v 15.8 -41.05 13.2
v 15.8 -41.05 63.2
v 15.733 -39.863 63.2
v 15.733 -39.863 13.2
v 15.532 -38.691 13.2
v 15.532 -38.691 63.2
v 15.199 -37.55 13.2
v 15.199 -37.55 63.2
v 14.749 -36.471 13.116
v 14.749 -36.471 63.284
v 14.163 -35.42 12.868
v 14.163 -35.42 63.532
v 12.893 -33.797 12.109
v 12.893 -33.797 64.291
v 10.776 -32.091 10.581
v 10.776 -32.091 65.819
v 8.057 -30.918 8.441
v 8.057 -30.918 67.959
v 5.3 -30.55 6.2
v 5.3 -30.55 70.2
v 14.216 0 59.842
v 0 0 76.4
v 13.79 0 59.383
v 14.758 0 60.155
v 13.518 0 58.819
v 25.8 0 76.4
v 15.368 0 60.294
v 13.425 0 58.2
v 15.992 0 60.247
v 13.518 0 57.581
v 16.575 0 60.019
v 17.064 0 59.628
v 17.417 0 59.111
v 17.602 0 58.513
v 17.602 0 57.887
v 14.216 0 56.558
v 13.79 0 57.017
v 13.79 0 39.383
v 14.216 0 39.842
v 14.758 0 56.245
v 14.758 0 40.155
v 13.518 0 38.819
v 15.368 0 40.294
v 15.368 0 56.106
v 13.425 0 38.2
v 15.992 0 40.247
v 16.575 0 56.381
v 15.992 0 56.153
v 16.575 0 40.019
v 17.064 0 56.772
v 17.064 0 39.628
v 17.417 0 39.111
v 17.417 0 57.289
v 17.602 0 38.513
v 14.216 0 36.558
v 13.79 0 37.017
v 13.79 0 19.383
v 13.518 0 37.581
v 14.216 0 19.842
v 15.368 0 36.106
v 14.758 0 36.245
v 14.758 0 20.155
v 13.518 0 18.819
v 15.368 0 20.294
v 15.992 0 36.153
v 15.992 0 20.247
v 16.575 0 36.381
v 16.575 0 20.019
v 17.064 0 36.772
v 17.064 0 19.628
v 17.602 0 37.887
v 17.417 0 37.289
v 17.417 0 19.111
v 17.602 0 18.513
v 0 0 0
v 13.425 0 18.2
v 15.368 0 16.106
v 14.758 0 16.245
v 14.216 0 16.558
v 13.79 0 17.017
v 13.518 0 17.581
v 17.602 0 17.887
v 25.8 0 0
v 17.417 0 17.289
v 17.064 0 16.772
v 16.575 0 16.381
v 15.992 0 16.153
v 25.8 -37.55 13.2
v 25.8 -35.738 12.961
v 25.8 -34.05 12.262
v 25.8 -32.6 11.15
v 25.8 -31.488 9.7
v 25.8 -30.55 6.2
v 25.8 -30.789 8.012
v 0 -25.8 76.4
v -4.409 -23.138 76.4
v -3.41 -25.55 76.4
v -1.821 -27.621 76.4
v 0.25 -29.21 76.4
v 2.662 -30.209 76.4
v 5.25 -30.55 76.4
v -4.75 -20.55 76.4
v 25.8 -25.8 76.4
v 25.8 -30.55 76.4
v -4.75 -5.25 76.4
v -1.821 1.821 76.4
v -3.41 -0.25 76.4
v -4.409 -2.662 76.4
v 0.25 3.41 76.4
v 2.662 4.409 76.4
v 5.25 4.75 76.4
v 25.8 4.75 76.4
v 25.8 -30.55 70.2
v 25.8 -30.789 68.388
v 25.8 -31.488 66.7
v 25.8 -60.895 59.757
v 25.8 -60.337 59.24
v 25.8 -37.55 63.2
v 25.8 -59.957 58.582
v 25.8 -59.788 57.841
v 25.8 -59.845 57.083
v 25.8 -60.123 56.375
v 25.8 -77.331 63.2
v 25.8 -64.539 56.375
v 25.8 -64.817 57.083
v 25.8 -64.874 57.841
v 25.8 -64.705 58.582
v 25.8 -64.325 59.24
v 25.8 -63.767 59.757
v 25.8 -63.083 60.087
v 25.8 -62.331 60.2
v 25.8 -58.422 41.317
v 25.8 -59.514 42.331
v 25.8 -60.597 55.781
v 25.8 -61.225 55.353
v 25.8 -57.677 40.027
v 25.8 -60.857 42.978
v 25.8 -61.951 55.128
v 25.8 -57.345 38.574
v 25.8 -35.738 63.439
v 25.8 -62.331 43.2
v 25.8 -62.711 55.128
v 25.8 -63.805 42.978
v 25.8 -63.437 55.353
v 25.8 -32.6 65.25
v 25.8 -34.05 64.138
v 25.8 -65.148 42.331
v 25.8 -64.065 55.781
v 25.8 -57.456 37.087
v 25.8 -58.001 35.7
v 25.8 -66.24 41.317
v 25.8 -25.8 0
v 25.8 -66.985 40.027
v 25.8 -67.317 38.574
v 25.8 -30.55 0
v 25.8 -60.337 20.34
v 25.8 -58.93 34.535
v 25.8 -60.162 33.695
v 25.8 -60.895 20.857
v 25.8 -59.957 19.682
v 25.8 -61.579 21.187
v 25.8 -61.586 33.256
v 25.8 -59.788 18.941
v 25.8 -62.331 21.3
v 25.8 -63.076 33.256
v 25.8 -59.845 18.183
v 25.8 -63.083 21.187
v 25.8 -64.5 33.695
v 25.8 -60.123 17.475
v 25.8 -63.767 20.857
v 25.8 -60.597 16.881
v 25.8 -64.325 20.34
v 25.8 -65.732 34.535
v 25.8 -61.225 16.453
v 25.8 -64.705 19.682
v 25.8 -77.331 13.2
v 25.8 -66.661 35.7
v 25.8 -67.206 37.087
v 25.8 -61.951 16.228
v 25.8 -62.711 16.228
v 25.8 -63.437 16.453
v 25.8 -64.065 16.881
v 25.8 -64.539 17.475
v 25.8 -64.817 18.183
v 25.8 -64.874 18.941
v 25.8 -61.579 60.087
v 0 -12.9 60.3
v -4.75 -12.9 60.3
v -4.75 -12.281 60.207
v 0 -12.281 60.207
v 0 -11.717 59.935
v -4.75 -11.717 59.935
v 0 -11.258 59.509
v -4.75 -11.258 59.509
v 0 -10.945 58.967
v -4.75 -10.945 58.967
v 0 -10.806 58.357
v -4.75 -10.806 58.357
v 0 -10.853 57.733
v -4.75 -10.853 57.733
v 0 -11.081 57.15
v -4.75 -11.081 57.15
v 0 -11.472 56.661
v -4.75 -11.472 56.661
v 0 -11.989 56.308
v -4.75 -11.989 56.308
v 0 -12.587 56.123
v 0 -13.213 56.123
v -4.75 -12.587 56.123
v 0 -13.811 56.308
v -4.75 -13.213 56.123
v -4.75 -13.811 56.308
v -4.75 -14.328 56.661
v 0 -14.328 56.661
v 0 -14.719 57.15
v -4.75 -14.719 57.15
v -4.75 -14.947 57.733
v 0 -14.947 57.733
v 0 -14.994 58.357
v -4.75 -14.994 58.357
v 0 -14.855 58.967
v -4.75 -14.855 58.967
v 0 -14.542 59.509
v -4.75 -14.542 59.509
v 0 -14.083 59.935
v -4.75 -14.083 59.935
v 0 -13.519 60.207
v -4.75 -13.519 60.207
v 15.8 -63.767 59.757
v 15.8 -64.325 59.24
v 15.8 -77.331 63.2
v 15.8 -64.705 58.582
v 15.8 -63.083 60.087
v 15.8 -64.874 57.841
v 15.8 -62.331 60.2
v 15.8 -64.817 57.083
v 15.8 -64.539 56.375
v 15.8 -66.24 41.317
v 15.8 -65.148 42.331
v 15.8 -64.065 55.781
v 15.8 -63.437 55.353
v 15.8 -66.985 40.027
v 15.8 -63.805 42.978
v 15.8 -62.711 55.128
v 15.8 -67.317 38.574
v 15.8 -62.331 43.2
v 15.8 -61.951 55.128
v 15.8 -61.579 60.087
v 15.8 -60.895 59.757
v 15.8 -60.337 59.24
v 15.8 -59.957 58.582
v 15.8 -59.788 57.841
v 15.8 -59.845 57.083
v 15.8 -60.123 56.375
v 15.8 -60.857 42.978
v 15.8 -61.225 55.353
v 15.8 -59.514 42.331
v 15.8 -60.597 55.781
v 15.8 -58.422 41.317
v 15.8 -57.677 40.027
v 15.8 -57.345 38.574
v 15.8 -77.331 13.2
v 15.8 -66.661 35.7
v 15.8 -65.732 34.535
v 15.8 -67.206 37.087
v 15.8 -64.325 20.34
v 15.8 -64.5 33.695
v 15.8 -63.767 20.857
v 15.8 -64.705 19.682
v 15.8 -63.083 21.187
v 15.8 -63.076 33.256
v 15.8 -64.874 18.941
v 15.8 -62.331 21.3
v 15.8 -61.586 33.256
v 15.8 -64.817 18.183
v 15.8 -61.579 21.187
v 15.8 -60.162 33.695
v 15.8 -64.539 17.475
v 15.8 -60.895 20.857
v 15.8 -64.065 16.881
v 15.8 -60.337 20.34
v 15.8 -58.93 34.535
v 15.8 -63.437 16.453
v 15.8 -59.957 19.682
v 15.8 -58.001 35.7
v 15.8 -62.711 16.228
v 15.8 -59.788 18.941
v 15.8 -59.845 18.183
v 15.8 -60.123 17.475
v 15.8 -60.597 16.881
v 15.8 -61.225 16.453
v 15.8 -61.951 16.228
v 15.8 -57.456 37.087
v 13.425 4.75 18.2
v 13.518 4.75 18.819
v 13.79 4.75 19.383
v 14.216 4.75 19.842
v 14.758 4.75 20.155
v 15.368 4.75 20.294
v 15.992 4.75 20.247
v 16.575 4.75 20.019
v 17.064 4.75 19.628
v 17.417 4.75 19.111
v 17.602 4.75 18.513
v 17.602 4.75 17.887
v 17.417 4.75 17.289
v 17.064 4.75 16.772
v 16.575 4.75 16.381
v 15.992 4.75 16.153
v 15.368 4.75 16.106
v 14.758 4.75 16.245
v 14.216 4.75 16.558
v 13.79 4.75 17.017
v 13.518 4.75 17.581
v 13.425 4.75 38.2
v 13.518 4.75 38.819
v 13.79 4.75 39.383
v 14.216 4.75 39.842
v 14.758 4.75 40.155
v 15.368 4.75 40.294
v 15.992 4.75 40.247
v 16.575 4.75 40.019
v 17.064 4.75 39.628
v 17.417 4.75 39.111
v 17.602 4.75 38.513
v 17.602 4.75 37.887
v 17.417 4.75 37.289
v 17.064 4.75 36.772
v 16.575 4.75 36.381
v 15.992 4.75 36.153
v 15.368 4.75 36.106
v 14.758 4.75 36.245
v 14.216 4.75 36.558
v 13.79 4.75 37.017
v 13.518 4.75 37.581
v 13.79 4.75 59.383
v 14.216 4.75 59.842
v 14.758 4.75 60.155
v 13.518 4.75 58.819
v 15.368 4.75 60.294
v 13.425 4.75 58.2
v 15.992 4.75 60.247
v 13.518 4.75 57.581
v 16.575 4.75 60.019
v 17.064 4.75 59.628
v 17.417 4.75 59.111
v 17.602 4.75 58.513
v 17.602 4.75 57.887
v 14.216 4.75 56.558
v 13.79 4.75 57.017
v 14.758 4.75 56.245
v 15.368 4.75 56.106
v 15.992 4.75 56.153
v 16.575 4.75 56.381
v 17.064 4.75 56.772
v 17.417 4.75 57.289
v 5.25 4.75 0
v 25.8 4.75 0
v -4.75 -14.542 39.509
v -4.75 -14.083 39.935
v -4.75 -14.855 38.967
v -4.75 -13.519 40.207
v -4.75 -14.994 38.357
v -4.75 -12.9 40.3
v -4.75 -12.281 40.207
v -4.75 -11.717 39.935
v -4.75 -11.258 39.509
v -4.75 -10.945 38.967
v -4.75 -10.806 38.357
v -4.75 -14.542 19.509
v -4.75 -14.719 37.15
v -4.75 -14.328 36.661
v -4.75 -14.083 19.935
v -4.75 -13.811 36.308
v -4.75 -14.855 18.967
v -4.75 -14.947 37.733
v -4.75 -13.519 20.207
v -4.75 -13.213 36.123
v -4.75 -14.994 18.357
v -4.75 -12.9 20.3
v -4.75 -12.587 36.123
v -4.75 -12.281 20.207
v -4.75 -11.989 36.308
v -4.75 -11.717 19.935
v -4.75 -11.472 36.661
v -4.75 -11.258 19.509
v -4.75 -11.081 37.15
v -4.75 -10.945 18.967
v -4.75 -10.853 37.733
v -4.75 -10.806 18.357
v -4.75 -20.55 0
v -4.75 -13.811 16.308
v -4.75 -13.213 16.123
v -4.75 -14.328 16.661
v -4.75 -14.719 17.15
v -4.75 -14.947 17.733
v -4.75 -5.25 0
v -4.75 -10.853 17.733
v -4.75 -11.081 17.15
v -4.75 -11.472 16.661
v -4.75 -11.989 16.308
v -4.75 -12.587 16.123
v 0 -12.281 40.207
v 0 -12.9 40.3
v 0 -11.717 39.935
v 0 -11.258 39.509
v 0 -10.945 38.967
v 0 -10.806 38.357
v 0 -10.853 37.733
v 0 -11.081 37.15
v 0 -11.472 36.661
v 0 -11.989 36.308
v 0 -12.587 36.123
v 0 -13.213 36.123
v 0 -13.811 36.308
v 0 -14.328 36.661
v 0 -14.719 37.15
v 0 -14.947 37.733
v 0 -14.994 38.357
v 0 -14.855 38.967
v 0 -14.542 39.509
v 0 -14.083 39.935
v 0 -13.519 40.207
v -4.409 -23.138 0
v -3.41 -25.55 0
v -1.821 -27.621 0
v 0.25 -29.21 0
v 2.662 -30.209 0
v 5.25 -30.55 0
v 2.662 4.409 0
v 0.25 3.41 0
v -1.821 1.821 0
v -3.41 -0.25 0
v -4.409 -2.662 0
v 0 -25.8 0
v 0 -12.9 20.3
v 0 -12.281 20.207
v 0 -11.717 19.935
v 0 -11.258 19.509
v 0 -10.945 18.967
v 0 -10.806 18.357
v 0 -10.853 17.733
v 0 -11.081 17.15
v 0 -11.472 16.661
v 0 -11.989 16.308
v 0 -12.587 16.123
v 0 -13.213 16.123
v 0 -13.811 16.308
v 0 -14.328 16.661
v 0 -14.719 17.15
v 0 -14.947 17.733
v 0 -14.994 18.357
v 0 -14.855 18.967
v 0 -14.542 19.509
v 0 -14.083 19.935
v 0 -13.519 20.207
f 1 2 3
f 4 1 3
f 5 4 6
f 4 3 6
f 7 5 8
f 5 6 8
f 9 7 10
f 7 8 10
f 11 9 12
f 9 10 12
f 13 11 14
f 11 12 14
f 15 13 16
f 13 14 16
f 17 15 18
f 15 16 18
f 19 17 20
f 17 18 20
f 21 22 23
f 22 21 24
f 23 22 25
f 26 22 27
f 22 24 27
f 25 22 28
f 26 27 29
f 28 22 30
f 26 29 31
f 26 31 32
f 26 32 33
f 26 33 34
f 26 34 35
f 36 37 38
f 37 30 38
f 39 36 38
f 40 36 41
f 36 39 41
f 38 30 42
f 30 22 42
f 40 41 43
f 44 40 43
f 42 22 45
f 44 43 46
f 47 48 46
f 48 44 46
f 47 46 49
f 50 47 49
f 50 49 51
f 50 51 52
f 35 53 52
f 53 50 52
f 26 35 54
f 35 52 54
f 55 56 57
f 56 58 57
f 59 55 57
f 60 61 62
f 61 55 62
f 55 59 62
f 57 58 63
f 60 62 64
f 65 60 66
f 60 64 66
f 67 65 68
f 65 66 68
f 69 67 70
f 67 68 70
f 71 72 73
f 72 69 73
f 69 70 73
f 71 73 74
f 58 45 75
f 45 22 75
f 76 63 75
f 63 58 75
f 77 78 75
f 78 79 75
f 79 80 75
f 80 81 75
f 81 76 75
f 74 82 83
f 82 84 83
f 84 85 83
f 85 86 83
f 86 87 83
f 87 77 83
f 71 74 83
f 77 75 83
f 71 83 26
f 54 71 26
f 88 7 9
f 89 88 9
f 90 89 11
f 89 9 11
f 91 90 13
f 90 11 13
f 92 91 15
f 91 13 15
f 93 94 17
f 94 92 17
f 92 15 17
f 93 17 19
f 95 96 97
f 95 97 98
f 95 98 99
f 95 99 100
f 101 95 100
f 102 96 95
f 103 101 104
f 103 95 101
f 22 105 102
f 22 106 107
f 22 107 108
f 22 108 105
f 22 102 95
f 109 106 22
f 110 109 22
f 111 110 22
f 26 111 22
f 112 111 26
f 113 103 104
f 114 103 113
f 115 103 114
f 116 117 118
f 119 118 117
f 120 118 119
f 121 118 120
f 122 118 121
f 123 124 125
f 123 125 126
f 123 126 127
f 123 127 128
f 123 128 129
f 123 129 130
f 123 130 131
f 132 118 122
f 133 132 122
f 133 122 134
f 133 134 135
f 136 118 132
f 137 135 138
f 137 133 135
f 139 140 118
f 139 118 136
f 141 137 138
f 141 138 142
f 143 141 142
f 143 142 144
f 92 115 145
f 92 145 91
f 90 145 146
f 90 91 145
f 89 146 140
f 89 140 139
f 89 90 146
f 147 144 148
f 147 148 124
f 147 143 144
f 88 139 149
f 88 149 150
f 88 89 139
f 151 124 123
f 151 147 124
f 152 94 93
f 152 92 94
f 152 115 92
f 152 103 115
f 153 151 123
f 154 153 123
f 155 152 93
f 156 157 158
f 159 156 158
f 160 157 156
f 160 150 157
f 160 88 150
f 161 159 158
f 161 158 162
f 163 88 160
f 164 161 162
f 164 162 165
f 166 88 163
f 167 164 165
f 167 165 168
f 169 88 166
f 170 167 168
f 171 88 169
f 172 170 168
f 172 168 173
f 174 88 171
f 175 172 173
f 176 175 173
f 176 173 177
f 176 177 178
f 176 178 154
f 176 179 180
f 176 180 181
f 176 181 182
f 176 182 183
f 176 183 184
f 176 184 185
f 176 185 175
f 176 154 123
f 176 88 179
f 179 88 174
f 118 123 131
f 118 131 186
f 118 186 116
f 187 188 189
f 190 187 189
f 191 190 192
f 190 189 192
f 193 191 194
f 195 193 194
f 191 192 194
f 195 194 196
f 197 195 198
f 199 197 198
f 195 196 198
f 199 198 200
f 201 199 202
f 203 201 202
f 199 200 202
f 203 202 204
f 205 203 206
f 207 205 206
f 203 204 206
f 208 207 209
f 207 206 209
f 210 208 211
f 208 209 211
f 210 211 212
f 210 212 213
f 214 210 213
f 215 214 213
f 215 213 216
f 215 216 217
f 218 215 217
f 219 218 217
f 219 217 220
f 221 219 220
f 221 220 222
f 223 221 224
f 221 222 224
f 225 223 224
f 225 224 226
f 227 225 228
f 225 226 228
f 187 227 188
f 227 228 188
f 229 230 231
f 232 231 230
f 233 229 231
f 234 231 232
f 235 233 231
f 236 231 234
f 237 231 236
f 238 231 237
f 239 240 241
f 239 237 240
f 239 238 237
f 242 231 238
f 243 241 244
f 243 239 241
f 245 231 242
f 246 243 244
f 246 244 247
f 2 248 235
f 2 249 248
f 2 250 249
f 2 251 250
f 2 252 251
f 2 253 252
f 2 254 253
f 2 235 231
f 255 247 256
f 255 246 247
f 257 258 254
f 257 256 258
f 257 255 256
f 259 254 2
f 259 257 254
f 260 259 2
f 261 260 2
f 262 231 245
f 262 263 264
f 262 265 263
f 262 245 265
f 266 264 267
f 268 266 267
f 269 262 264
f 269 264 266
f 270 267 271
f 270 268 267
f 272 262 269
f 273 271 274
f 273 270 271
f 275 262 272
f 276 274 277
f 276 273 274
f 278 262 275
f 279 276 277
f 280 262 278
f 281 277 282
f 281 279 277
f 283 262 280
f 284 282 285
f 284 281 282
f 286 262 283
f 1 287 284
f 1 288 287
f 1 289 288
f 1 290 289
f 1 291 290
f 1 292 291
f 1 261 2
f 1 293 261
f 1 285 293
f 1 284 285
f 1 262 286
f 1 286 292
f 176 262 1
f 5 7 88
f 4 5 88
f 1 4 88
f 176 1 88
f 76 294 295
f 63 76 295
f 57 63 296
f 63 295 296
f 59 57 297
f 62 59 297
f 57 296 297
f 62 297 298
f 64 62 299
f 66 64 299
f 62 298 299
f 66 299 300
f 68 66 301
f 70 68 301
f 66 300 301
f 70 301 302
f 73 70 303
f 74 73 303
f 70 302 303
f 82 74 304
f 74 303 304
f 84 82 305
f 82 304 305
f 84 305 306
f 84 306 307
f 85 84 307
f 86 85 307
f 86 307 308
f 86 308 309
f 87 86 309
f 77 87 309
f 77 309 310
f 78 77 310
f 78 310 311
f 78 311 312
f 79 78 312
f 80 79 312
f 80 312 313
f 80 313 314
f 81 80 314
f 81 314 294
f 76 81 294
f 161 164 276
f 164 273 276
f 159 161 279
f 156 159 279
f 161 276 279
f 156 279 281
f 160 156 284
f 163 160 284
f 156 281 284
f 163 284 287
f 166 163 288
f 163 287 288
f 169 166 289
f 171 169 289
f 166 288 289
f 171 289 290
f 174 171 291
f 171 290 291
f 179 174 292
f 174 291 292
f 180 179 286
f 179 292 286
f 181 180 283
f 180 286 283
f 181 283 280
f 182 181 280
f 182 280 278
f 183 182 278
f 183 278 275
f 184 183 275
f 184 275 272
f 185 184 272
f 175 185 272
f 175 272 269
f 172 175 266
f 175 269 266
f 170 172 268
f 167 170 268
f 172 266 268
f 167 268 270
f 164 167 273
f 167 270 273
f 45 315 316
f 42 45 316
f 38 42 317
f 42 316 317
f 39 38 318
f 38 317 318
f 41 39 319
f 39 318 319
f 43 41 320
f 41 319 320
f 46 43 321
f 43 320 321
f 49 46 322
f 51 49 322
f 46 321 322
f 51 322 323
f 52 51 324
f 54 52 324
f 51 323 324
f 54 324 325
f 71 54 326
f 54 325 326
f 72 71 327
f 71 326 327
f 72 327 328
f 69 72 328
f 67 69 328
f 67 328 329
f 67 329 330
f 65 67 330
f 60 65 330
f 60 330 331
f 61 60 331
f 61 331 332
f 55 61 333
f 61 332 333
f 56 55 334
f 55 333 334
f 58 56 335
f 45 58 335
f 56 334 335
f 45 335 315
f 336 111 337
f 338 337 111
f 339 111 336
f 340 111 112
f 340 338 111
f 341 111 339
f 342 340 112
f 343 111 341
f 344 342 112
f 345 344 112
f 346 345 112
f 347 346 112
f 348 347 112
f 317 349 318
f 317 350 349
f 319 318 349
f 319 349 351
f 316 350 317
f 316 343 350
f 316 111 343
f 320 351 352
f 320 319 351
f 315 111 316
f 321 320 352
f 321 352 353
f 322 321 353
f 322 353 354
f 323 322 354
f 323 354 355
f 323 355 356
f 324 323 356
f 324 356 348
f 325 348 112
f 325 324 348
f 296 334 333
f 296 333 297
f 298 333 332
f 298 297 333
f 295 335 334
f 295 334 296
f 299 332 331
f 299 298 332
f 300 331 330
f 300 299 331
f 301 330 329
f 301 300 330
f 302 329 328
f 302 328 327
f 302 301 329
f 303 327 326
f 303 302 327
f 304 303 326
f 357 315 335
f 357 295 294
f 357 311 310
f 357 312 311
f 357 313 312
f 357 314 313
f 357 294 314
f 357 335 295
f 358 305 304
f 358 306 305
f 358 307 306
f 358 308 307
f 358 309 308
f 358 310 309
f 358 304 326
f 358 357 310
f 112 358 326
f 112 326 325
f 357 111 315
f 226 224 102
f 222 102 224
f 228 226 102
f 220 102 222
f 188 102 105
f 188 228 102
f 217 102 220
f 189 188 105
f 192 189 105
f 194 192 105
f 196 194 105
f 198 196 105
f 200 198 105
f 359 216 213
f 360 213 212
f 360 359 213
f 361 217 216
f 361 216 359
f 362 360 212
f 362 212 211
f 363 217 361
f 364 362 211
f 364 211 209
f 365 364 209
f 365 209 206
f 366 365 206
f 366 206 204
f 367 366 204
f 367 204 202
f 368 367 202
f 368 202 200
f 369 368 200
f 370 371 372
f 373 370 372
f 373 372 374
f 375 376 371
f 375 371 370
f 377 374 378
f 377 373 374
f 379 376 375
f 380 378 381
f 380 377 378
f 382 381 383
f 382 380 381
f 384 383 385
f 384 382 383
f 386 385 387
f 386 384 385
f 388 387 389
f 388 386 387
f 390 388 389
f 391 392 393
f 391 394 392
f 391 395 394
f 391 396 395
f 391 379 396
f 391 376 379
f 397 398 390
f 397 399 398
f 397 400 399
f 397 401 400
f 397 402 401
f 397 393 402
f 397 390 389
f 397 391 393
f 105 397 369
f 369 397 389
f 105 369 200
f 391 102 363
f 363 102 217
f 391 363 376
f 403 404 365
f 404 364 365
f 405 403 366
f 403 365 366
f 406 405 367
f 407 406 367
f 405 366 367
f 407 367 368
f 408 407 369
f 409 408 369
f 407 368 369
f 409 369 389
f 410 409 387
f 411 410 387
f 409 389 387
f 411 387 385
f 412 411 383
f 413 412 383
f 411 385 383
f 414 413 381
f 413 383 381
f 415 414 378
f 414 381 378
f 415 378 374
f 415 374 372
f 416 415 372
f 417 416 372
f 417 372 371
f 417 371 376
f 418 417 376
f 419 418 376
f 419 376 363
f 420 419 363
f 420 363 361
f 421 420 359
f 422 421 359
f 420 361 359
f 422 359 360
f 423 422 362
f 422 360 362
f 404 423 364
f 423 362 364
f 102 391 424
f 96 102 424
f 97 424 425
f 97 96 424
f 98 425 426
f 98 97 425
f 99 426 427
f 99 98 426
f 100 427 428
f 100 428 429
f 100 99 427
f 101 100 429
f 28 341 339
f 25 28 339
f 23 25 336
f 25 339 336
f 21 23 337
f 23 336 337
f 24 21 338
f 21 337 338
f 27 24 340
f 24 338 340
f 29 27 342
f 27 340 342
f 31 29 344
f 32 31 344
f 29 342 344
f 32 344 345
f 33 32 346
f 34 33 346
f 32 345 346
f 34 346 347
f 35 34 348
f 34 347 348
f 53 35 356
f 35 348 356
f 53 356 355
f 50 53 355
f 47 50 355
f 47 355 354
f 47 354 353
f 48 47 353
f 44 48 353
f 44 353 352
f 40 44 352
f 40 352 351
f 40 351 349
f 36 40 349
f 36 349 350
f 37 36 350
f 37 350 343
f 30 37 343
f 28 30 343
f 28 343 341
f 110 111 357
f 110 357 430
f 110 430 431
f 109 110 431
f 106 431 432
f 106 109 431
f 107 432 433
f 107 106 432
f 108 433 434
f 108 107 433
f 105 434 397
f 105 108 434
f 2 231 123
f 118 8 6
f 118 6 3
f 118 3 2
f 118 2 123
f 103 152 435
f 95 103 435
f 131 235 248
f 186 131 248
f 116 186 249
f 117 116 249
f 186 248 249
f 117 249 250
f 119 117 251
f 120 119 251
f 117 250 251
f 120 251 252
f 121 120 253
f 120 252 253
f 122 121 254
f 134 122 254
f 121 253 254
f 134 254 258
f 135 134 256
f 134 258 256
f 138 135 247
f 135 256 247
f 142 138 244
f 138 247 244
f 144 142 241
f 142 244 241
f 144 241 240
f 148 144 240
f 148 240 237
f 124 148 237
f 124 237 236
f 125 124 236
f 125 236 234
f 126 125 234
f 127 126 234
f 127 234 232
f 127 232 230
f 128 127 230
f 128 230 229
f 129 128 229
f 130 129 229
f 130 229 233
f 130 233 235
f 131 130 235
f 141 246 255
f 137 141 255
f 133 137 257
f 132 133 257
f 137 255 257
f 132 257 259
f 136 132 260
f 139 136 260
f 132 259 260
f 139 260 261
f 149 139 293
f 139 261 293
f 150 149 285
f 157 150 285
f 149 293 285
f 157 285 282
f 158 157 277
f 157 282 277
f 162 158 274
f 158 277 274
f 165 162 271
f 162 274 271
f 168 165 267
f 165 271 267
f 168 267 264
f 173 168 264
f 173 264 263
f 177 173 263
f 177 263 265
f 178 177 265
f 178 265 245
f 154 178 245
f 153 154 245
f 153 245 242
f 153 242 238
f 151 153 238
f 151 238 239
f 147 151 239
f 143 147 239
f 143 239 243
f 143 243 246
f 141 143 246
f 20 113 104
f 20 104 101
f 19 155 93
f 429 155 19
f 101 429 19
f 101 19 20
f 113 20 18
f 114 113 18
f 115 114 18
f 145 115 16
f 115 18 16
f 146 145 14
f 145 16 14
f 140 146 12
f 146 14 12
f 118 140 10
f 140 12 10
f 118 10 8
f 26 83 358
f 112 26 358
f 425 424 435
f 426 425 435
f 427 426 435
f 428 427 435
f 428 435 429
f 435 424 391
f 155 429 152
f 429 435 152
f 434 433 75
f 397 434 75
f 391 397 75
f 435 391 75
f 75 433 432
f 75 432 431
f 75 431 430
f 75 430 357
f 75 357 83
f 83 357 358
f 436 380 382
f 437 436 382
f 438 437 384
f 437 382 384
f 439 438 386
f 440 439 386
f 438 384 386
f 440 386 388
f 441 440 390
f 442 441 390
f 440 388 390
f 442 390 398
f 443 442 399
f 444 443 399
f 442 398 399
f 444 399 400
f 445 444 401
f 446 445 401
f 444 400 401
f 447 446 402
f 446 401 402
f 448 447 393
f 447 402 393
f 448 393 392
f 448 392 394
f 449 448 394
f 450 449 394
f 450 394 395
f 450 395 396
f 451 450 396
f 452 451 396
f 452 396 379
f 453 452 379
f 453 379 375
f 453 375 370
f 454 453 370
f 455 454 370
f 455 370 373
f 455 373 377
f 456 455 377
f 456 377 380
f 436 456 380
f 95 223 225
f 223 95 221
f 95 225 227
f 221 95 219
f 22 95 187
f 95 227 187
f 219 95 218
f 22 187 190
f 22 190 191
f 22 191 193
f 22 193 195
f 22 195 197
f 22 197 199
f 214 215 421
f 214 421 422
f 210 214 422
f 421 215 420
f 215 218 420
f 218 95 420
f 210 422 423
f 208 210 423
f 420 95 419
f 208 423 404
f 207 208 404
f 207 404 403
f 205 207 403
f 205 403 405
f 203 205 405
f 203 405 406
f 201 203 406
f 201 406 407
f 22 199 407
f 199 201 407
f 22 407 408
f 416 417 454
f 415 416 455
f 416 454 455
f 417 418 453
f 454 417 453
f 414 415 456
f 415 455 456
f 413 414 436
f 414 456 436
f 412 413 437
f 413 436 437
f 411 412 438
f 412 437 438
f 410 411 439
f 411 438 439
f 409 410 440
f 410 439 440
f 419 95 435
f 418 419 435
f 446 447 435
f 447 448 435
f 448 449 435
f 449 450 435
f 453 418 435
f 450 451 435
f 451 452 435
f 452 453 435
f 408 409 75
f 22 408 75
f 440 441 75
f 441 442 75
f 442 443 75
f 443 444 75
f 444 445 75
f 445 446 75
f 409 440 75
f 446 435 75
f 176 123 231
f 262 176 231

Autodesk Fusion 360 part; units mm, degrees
sketch "Sketch1" plane through (0, 0, 0) normal (0, 0, 1) x (1, 0, 0)
  line L0 (0, 0) -> (25.8, 0)
  line L1 (25.8, 0) -> (25.8, -25.8)
  line L2 (0, 0) -> (25.8, 0)
  line L3 (25.8, 0) -> (25.8, -25.8)
  line L4 (25.8, -25.8) -> (0, -25.8)
  line L5 (0, -25.8) -> (0, 0)
  line L6 (25.8, -30.55) -> (-4.75, -30.55)
  line L7 (-4.75, -30.55) -> (-4.75, 4.75)
  line L8 (-4.75, 4.75) -> (25.8, 4.75)
  line L9 (25.8, 0) -> (25.8, 4.75)
  line L10 (25.8, 4.75) -> (25.8, -30.55)
  line L11 (25.8, -12.9) -> (25.8, -62.331)
  line L12 (25.8, -62.331) -> (25.8, -77.331)
  line L13 (25.8, -62.331) -> (25.8, -47.331)
  line L14 (25.8, -47.331) -> (15.8, -47.331)
  line L15 (15.8, -47.331) -> (15.8, -30.55)
  line L16 (15.8, -47.331) -> (15.8, -77.331)
  line L17 (25.8, -77.331) -> (15.8, -77.331)
  dimension "d1" = 25.8
  dimension "d2" = 25.8
  dimension "d4" = 49.431
  dimension "d5" = 15
  dimension "d6" = 15
  dimension "d7" = 10
extrude "Extrude1" add sketch "Sketch1" along normal blind 76.4 contours L0 L2 L4 L5 L6 L7 L8 L9 L10 L11
ref_plane "WorkPlane1" through (10.525, -12.9, 38.2) normal (0, 0, 1) x (1, 0, 0)
extrude "Extrude2" add sketch "Sketch1" along normal mid plane 50 from surface at 38.2 contours L6 L11 L14 L15 | L11 L12 L13 L14 L16 L17
sketch "Sketch2" plane through (15.8, 0, 0) normal (-1, 0, 0) x (0, 0, 1)
  line L0 (13.2, -77.331) -> (63.2, -77.331)
  line L1 (63.2, -77.331) -> (63.2, -30.55)
  line L2 (63.2, -30.55) -> (13.2, -30.55)
  line L3 (13.2, -30.55) -> (13.2, -77.331)
  line L4 (0, -47.331) -> (0, -77.331)
  line L5 (0, -62.331) -> (0, -77.331)
  line L6 (0, -62.331) -> (0, -47.331)
  line L7 (0, -77.331) -> (0, -62.331)
  line L8 (13.2, -62.331) -> (63.2, -62.331) construction
  circle A0 centre (38.2, -62.331) radius 5
  line L9 (63.2, -62.331) -> (60.2, -62.331)
  circle A1 centre (57.65, -62.331) radius 2.55
  line L10 (38.2, -62.331) -> (38.2, -60) construction
  circle A2 centre (18.75, -62.331) radius 2.55
  dimension "d13" = 10
  dimension "d14" = 3
  dimension "d15" = 5.1
extrude "Extrude3" cut sketch "Sketch2" against normal blind 61 contours A1 | A0 | A2
fillet "Fillet1" radius 10 2 edges at (-4.75, -30.55, 38.2) (-4.75, 4.75, 38.2)
fillet "Fillet2" radius 7 2 edges at (20.8, -30.55, 63.2) (20.8, -30.55, 13.2)
fillet "Fillet3" radius 10.5 1 edges at (15.8, -30.55, 38.2)
sketch "Sketch3" plane through (-4.75, 0, 0) normal (-1, 0, 0) x (0, 0, 1)
  line L0 (76.4, -5.25) -> (0, -5.25)
  line L1 (0, -5.25) -> (0, -20.55)
  line L2 (0, -20.55) -> (76.4, -20.55)
  line L3 (76.4, -20.55) -> (76.4, -5.25)
  line L4 (0, -12.9) -> (76.4, -12.9) construction
  circle A0 centre (38.2, -12.9) radius 2.1
  line L5 (38.2, -12.9) -> (58.2, -12.9) construction
  circle A1 centre (58.2, -12.9) radius 2.1
  line L6 (38.2, -12.9) -> (18.2, -12.9) construction
  circle A2 centre (18.2, -12.9) radius 2.1
  dimension "d24" = 4.2
  dimension "d25" = 20
  dimension "d26" = 4.2
  dimension "d27" = 20
  dimension "d28" = 4.2
extrude "Extrude4" cut sketch "Sketch3" against normal blind 40 contours A0 | A1 | A2
sketch "Sketch4" plane through (0, 4.75, 0) normal (0, 1, 0) x (-1, 0, 0)
  line L0 (-5.25, 0) -> (-5.25, 76.4)
  line L1 (-5.25, 76.4) -> (-25.8, 76.4)
  line L2 (-25.8, 76.4) -> (-25.8, 0)
  line L3 (-25.8, 0) -> (-5.25, 0)
  line L4 (4.75, 36.1) -> (4.75, 40.3)
  line L5 (4.75, 16.1) -> (4.75, 20.3)
  line L6 (4.75, 56.1) -> (4.75, 60.3)
  line L7 (4.75, 18.2) -> (-25.8, 18.2) construction
  line L8 (4.75, 38.2) -> (-25.8, 38.2) construction
  line L9 (4.75, 58.2) -> (-25.8, 58.2) construction
  line L10 (-25.8, 18.2) -> (-5.25, 18.2) construction
  line L11 (-5.25, 38.2) -> (-25.8, 38.2)
  line L12 (-25.8, 58.2) -> (-5.25, 58.2)
  circle A0 centre (-15.525, 18.2) radius 2.1
  circle A1 centre (-15.525, 38.2) radius 2.1
  circle A2 centre (-15.525, 58.2) radius 2.1
  point P0 (4.75, 18.2)
  dimension "d31" = 4.2
  dimension "d32" = 4.2
  dimension "d33" = 4.2
extrude "Extrude5" cut sketch "Sketch4" against normal blind 15 contours L11 A1 | L11 A1 | L12 A2 | L12 A2 | A0
